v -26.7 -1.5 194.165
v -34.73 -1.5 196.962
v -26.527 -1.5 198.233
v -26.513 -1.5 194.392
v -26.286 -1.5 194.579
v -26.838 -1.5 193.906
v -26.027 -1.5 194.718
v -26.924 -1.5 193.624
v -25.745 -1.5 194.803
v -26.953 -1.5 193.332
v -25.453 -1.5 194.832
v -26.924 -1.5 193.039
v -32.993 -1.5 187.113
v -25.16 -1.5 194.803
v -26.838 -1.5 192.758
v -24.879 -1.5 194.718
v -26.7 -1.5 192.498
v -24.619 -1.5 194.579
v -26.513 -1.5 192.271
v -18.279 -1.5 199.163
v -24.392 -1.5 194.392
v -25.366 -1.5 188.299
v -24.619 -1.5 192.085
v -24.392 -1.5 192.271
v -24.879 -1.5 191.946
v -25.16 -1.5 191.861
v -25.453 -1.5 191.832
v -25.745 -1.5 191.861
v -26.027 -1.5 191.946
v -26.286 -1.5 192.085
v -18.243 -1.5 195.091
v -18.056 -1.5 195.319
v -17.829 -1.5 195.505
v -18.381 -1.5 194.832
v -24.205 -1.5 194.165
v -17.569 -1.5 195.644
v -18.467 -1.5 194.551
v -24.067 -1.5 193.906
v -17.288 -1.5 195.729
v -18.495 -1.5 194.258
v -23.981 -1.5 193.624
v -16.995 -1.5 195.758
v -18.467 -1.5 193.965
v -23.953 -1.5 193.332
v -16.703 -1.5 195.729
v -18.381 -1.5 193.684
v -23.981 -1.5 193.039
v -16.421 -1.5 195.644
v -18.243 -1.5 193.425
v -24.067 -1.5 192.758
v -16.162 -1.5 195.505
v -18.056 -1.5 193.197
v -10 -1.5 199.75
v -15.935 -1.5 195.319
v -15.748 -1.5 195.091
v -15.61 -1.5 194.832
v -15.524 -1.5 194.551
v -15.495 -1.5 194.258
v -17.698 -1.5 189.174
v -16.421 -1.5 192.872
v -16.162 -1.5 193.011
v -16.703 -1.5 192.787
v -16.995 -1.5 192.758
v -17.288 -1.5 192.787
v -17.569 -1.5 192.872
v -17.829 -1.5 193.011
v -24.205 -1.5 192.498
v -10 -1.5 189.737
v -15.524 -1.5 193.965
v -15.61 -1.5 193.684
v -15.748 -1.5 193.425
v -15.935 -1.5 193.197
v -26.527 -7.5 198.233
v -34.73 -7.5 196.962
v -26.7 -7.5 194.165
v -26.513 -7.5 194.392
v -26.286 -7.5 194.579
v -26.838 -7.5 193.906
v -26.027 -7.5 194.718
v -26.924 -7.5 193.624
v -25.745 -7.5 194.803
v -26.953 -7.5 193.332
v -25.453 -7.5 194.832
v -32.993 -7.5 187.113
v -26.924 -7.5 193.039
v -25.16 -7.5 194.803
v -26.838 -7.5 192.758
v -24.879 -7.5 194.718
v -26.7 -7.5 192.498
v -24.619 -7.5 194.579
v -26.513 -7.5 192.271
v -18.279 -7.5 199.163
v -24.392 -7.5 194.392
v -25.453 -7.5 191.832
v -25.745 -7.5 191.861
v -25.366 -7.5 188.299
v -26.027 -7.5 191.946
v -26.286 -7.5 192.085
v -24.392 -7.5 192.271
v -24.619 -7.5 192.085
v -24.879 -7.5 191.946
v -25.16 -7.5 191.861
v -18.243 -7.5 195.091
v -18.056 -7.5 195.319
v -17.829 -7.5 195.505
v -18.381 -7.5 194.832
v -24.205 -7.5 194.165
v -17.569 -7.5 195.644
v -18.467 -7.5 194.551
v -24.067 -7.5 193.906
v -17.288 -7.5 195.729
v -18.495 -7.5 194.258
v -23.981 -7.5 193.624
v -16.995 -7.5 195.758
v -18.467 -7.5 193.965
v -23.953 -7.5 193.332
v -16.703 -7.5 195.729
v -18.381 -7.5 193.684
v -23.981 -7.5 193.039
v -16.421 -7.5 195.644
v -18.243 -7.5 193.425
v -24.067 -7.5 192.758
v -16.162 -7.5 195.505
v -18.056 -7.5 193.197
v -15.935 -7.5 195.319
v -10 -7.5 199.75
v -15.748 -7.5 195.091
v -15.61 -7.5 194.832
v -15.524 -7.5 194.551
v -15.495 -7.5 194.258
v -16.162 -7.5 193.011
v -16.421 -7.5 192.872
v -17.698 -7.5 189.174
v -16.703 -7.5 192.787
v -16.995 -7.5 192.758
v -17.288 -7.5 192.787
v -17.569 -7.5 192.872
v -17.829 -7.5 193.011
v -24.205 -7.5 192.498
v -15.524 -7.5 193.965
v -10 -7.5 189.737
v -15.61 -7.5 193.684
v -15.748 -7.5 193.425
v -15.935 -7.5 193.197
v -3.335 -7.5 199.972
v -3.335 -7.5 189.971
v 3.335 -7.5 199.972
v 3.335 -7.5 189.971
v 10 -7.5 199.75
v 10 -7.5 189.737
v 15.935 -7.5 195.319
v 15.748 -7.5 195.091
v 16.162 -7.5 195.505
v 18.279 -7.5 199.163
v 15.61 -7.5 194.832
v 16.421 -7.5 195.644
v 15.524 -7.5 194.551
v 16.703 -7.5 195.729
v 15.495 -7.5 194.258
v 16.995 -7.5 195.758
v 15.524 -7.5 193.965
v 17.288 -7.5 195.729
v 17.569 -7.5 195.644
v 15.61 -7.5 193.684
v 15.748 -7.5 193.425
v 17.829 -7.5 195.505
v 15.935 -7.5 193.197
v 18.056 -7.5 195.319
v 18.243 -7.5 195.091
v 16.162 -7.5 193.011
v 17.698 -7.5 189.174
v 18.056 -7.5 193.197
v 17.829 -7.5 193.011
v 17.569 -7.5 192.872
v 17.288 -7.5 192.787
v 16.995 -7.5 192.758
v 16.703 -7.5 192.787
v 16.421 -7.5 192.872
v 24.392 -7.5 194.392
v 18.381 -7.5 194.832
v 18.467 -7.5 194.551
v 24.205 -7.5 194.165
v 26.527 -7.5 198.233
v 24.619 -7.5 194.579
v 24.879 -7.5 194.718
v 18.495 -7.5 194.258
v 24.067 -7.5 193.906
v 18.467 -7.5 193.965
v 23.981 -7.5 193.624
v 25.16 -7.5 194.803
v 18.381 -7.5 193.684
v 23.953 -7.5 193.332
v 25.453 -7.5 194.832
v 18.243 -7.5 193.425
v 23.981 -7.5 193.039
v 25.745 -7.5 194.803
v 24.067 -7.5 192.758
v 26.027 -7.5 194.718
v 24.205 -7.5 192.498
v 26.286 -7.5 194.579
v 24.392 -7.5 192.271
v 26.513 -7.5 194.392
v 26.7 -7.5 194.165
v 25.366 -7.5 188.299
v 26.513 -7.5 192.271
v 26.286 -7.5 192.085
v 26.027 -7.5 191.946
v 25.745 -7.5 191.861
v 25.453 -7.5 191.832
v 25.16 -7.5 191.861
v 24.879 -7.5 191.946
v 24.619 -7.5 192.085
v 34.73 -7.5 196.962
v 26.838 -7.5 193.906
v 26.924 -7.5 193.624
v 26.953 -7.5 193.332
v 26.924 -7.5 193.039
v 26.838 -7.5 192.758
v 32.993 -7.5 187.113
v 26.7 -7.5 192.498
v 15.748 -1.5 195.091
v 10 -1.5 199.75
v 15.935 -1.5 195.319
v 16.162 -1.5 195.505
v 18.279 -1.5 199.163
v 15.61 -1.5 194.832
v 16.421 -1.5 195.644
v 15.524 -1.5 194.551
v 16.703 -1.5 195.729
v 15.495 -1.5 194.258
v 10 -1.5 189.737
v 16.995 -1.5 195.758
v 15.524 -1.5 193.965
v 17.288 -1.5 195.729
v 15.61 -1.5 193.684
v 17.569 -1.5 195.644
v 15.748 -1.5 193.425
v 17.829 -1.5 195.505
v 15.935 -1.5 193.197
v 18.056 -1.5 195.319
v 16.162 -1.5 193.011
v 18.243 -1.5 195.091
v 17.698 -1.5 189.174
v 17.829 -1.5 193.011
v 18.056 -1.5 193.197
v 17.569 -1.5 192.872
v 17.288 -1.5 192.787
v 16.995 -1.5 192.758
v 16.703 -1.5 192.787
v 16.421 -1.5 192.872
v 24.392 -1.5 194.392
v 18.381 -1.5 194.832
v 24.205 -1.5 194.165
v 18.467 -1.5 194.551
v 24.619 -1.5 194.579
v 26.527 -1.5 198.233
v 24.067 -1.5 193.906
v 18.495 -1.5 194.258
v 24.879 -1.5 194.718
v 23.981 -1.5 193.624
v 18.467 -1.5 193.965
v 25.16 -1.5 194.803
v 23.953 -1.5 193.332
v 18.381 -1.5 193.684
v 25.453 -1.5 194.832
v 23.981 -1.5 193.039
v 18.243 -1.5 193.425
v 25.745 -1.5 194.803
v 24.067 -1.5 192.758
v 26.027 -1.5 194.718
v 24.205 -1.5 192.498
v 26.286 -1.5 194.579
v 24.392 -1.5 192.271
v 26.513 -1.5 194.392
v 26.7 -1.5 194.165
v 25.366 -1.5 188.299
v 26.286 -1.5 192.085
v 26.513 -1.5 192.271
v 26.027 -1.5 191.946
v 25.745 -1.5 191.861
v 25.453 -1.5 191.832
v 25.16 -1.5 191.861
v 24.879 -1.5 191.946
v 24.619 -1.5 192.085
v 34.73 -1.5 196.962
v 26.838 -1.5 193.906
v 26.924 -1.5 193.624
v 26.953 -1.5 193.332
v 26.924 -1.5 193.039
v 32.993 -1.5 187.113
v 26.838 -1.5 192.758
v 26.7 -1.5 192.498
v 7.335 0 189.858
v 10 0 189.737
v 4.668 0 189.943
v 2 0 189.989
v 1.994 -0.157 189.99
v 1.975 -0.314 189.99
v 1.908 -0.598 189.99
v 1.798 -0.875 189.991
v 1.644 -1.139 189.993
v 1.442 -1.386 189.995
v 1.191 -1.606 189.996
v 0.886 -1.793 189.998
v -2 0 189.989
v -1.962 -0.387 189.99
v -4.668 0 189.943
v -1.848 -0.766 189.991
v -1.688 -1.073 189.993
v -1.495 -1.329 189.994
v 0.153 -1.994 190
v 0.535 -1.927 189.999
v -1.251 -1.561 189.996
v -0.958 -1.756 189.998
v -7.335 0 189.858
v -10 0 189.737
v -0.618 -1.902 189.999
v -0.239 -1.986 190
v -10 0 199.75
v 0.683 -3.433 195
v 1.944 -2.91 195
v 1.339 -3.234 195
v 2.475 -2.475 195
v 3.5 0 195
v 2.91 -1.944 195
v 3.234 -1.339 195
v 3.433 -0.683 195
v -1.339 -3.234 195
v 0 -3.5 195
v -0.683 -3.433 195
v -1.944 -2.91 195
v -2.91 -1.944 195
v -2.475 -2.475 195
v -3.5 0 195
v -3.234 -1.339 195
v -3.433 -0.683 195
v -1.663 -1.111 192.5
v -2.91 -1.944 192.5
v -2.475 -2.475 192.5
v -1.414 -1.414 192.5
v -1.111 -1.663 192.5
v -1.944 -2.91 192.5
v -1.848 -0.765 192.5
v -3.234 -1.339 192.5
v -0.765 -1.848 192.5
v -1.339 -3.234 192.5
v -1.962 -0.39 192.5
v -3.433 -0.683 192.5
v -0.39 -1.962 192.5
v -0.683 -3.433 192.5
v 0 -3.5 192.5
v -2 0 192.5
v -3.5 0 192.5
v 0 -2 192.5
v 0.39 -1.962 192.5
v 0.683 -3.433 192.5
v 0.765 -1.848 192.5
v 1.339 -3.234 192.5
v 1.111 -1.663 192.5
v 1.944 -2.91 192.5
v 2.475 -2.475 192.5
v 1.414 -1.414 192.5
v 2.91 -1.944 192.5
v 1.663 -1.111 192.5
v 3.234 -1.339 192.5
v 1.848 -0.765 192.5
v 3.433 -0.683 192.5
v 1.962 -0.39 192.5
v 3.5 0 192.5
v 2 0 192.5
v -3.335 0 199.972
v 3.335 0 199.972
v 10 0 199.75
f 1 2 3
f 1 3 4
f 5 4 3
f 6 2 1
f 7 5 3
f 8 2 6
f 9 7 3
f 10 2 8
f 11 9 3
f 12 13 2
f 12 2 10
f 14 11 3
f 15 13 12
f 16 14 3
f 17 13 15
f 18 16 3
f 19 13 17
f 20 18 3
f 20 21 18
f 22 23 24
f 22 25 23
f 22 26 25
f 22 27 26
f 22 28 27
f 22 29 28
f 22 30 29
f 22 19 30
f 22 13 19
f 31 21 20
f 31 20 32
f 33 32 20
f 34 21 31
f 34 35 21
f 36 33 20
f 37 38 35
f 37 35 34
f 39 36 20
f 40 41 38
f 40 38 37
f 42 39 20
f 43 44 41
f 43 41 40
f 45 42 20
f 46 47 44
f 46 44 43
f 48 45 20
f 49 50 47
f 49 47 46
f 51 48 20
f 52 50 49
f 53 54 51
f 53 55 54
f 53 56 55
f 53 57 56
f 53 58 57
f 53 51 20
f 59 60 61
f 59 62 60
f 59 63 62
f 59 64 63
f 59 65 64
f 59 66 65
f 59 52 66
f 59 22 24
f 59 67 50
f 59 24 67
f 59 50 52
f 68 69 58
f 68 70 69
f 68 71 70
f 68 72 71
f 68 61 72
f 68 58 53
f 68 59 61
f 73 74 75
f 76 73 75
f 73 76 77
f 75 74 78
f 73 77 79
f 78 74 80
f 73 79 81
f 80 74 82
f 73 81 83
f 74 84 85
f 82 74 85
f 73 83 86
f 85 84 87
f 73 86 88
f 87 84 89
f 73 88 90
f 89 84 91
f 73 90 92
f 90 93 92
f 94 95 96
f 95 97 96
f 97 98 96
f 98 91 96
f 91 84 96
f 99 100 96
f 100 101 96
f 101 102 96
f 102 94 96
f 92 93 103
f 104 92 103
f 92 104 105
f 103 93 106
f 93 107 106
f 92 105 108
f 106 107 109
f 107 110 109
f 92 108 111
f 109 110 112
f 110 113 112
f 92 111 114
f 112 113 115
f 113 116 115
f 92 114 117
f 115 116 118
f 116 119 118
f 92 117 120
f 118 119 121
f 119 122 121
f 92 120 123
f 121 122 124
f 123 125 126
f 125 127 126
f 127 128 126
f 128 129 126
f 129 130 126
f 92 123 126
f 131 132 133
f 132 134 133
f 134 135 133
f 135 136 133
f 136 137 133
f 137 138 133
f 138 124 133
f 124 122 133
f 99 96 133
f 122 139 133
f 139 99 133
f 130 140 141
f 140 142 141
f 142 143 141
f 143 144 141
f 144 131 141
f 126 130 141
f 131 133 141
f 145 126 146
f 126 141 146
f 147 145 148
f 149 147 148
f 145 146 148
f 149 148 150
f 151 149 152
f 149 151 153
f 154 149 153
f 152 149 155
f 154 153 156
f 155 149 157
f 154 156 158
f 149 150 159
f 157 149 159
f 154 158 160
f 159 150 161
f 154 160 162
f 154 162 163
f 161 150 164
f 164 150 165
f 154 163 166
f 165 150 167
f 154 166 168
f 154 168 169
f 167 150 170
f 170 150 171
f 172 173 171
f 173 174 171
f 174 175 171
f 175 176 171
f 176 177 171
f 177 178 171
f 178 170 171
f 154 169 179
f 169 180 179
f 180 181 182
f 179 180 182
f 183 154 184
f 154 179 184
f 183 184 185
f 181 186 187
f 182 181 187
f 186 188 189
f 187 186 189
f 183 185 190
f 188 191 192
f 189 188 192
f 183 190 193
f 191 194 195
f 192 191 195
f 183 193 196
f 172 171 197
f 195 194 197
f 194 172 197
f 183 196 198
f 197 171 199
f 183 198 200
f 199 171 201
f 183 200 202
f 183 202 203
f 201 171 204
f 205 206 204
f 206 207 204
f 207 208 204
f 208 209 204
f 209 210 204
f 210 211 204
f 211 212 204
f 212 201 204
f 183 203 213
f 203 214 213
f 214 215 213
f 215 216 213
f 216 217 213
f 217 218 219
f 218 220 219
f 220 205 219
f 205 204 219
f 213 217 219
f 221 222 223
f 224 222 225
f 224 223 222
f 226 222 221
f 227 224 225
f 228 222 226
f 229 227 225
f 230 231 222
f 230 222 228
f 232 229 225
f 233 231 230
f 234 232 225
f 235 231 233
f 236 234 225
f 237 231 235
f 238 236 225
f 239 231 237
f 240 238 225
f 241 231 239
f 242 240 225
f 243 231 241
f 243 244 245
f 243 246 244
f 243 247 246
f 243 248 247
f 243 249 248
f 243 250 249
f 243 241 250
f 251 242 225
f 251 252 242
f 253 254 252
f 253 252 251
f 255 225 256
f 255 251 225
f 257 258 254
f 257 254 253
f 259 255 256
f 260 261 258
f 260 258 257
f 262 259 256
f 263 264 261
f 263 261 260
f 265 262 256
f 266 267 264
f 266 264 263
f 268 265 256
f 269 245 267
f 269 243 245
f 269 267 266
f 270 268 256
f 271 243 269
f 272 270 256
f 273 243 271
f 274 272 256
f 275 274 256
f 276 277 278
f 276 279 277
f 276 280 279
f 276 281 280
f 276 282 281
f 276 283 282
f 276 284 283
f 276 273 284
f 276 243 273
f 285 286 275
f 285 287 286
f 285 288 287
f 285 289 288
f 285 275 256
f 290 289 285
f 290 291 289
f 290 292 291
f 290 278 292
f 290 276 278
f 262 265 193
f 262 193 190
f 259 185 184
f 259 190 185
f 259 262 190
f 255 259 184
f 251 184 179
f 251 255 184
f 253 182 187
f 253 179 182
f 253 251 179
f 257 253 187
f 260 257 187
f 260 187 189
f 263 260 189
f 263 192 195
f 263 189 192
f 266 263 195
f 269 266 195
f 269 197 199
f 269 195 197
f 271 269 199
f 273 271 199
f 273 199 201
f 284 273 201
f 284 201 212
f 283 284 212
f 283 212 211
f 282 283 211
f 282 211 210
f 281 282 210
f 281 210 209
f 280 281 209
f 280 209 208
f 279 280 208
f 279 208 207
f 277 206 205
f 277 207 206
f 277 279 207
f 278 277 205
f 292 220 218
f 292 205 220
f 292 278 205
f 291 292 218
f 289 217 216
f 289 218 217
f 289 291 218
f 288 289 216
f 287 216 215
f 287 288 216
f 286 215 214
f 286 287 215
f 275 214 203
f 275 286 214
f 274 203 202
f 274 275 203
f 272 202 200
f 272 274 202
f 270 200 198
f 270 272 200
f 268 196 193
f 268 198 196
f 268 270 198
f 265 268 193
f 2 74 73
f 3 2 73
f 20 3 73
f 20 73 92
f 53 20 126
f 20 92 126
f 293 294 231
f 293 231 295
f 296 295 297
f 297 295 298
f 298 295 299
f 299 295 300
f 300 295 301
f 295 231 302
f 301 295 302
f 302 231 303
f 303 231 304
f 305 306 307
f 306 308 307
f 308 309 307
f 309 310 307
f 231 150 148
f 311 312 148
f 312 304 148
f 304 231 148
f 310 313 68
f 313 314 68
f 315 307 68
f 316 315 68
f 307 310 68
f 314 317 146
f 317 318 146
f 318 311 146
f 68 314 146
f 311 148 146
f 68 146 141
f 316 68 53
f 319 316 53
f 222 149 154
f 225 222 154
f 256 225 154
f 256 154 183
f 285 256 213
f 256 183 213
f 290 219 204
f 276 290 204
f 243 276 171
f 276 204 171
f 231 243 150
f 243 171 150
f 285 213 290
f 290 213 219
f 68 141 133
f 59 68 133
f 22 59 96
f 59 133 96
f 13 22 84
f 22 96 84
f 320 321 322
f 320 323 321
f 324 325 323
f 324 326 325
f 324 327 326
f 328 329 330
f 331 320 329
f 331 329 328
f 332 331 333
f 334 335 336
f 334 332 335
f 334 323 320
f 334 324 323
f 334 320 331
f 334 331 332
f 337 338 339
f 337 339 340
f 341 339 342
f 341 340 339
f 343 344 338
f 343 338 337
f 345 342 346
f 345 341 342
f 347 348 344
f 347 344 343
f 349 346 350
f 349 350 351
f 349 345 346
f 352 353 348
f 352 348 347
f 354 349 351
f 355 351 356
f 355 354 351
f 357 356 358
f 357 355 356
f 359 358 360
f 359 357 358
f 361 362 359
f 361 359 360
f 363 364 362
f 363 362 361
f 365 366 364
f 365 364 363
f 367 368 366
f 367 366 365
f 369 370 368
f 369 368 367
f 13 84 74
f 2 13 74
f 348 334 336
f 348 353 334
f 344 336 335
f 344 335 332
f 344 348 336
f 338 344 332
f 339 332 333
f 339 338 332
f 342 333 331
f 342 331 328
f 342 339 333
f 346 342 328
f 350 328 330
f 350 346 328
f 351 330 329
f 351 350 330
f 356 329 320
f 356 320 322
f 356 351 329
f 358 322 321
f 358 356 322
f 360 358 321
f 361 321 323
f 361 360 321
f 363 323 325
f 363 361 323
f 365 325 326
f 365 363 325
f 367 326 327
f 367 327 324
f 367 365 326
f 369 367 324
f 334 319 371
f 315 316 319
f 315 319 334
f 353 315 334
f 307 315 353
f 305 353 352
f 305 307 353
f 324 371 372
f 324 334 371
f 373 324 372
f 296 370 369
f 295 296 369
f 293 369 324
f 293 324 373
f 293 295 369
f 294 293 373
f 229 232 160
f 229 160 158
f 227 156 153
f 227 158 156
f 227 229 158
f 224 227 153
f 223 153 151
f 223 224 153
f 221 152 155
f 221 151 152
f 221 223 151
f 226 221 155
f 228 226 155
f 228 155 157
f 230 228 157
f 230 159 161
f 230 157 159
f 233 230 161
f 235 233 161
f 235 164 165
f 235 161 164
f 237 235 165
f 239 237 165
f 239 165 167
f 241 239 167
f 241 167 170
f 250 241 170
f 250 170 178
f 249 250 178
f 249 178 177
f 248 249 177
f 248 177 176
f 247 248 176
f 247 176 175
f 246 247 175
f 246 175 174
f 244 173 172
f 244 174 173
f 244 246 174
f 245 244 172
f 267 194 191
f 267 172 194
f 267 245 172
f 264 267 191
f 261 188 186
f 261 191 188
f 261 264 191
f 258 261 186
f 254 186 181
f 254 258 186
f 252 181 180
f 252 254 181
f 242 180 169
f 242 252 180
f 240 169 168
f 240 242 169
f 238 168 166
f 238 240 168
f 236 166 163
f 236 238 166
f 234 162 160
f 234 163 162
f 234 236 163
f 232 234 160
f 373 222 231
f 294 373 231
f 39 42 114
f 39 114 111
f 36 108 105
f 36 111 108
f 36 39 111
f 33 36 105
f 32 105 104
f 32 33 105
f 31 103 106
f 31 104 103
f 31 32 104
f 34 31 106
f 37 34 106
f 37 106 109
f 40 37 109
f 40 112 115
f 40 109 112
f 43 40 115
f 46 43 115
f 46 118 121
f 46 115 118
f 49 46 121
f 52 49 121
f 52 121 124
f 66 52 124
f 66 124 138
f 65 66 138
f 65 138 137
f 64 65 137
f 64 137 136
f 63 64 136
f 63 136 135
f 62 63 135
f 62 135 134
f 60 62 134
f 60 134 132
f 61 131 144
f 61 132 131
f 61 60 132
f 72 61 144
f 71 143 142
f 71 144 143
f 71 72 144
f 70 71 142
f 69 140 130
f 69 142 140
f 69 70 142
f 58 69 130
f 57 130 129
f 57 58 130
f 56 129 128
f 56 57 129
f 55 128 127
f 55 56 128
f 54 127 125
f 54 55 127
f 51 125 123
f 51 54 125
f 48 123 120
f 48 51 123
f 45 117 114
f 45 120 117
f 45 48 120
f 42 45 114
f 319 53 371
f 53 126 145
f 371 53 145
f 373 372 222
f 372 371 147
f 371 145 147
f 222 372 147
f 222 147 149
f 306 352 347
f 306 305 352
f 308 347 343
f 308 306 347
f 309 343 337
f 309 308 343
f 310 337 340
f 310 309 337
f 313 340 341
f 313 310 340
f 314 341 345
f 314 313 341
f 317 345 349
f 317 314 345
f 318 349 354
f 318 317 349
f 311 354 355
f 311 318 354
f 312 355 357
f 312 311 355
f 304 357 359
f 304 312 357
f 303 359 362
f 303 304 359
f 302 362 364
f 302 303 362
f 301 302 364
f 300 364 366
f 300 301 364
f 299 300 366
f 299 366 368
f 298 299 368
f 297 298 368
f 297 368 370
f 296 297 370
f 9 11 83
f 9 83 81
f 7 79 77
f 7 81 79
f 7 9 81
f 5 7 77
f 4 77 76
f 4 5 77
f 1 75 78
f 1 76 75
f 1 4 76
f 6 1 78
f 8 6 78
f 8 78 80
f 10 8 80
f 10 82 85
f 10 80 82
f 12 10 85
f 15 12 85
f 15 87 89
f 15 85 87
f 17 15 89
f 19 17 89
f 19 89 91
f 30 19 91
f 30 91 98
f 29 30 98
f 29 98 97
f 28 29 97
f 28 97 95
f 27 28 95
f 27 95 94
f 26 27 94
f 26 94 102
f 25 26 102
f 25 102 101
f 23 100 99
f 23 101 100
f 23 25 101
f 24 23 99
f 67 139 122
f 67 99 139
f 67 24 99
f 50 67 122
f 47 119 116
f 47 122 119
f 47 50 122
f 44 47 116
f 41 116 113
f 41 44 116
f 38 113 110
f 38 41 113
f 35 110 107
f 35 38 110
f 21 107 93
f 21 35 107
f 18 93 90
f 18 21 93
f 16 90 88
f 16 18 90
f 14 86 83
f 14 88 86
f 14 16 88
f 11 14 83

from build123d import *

# Parameters (mm, degrees)
BOSS_EXTRUDE3_DEPTH     = 6
BOSS_EXTRUDE3_2_DEPTH   = 6
BOSS_EXTRUDE4_DEPTH     = 7.5
CUT_EXTRUDE1_DEPTH      = 204.131478569
CUT_EXTRUDE1_DEPTH_BACK = 204.131478569
SKETCH4_R               = 1.5


with BuildPart() as part:
    # Sketch2 → Boss-Extrude3 (new body)
    with BuildSketch(Plane(origin=(0, -7.5, 0), x_dir=(1, 0, 0), z_dir=(0, 1, 0))):
        with BuildLine():
            ThreePointArc((-10, -189.73665961), (-21.536552519, -188.775466906), (-32.993153757, -187.113473072))
            Line((-32.993153757, -187.113473072), (-34.729635533, -196.961550602))
            ThreePointArc((-34.729635533, -196.961550602), (-22.408228804, -198.7407137), (-10, -199.749843554))
            Line((-10, -199.749843554), (-10, -189.73665961))
        make_face()
    extrude(amount=BOSS_EXTRUDE3_DEPTH)



with BuildPart() as body_2:
    # Sketch2 → Boss-Extrude3 2 (new body)
    with BuildSketch(Plane(origin=(0, -7.5, 0), x_dir=(1, 0, 0), z_dir=(0, 1, 0))):
        with BuildLine():
            ThreePointArc((32.993153757, -187.113473072), (21.536552519, -188.775466906), (10, -189.73665961))
            Line((10, -189.73665961), (10, -199.749843554))
            ThreePointArc((10, -199.749843554), (22.408228804, -198.7407137), (34.729635533, -196.961550602))
            Line((34.729635533, -196.961550602), (32.993153757, -187.113473072))
        make_face()
    extrude(amount=BOSS_EXTRUDE3_2_DEPTH)


with BuildPart() as part_1:
    add(part.part)

    add(body_2.part)  # Boss-Extrude4 merges body 2
    # Sketch2<3> → Boss-Extrude4 (add)
    with BuildSketch(Plane(origin=(0, -7.5, 0), x_dir=(1, 0, 0), z_dir=(0, 1, 0))):
        with BuildLine():
            ThreePointArc((10, -189.73665961), (0, -190), (-10, -189.73665961))
            Line((-10, -189.73665961), (-10, -199.749843554))
            ThreePointArc((-10, -199.749843554), (0, -200), (10, -199.749843554))
            Line((10, -199.749843554), (10, -189.73665961))
        make_face()
    extrude(amount=BOSS_EXTRUDE4_DEPTH)

    # Sketch3 → hole (revolve, cut)
    with BuildSketch(Plane(origin=(0, 0, 0), x_dir=(1, 0, 0), z_dir=(0, 1, 0))):
        Polygon((3.5, -192.5), (2, -192.5), (2, -180), (0, -180), (0, -195), (3.5, -195), align=None)
    revolve(axis=Axis((0, 0, 0), (0, 0, 1)), mode=Mode.SUBTRACT)

    # Sketch4 → Cut-Extrude1 (cut, two sides: drawn at the far end of the back side and taken through both)
    with BuildSketch(Plane.XZ.offset(7.5).offset(-CUT_EXTRUDE1_DEPTH_BACK)):
        with Locations(Location((25.452607483, 193.331747968, 0), (0, 0, 90))):
            Circle(SKETCH4_R)
        with Locations(Location((16.995369836, 194.257966128, 0), (0, 0, 90))):
            Circle(SKETCH4_R)
        with Locations(Location((-25.452607483, 193.331747968, 0), (0, 0, 90))):
            Circle(SKETCH4_R)
        with Locations(Location((-16.995369836, 194.257966128, 0), (0, 0, 90))):
            Circle(SKETCH4_R)
    extrude(amount=CUT_EXTRUDE1_DEPTH + CUT_EXTRUDE1_DEPTH_BACK, mode=Mode.SUBTRACT)


solid = part_1.part
